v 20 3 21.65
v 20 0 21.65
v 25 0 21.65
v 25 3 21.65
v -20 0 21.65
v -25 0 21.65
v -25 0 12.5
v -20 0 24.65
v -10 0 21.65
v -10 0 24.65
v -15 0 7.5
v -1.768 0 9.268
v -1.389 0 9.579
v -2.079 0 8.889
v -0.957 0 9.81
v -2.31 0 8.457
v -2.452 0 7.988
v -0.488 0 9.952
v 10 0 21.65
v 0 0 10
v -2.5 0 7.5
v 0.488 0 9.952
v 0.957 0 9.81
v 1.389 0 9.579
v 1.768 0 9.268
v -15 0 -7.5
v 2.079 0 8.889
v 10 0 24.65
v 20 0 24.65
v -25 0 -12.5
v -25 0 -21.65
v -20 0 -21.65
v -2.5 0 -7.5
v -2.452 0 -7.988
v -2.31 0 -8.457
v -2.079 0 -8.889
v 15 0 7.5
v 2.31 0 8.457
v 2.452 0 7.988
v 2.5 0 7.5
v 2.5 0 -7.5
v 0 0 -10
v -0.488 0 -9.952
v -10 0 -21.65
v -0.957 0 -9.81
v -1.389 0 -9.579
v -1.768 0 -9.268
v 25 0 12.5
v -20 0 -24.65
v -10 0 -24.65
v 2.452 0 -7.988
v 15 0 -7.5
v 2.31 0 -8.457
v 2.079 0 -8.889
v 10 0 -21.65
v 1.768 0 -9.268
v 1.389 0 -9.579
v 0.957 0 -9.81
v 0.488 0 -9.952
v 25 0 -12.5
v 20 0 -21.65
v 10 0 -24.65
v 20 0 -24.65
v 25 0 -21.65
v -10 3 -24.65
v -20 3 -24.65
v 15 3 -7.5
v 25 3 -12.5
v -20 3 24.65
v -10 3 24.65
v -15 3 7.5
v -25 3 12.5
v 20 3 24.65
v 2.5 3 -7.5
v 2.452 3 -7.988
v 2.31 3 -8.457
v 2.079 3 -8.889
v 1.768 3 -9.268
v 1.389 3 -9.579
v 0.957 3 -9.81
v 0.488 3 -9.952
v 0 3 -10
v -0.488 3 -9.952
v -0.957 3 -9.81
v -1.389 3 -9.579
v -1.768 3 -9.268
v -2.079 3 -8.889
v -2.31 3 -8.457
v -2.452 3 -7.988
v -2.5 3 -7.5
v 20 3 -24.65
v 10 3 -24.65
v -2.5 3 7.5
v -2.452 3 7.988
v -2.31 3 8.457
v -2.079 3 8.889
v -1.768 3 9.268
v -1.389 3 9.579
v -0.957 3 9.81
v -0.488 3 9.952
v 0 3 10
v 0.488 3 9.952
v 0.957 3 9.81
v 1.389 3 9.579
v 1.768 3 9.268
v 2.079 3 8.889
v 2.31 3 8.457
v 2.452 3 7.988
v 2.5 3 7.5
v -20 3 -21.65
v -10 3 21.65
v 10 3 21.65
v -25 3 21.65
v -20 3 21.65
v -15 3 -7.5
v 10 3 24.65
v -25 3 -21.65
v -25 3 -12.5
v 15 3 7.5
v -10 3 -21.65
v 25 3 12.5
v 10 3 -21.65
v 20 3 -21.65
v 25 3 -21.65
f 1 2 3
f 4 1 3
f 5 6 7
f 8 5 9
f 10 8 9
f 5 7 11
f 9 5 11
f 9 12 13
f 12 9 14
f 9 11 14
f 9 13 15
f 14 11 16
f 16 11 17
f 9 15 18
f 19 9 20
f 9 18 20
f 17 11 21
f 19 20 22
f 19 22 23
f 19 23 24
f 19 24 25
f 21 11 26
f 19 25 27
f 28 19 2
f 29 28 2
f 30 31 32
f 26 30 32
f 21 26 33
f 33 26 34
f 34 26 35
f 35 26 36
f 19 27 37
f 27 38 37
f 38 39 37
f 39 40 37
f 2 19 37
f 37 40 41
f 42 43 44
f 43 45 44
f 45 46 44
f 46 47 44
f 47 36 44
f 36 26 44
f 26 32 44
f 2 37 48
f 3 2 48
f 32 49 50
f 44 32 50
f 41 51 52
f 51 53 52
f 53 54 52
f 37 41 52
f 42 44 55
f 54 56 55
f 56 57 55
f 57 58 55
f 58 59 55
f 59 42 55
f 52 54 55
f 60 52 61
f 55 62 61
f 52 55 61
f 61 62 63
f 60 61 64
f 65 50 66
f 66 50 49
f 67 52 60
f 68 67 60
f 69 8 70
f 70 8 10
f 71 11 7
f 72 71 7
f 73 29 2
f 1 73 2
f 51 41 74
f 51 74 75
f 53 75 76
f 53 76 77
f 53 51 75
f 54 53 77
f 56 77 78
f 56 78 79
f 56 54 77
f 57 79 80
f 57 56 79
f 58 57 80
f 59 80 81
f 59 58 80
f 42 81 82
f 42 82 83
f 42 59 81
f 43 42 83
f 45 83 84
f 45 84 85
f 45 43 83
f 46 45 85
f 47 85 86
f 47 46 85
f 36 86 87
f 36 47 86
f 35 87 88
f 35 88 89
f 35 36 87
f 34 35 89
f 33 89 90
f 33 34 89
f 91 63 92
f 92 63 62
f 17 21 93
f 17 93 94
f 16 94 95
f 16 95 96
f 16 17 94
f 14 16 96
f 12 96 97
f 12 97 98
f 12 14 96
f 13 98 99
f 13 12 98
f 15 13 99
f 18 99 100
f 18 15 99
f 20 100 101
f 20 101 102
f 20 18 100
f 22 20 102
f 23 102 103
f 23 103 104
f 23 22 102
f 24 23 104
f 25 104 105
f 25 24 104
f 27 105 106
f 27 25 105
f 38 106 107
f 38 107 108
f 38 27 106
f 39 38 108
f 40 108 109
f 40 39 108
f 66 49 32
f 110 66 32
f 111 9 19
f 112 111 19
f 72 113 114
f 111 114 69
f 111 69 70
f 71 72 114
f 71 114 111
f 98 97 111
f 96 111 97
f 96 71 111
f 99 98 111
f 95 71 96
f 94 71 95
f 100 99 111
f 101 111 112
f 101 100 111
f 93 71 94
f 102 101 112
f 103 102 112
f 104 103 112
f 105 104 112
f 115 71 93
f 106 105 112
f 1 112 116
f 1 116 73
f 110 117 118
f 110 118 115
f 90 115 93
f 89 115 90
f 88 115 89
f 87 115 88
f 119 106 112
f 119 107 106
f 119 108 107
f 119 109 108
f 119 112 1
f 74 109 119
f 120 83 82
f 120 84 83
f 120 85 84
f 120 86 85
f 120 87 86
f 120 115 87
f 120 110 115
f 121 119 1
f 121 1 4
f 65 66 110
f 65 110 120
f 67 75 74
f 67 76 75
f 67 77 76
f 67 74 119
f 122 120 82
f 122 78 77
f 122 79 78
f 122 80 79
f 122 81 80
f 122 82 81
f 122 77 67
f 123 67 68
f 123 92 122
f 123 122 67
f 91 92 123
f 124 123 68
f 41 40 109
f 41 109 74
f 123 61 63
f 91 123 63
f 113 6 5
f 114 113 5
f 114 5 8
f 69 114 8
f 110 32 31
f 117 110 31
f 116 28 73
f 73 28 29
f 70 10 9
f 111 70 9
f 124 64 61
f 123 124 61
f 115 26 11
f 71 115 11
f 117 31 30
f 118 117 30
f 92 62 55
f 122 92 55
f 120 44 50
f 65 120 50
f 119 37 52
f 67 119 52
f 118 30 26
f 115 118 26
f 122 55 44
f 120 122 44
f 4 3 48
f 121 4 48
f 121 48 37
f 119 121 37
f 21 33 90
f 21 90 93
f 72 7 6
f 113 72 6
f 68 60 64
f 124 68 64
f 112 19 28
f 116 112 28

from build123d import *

# Parameters (mm, degrees)
EXTRUDE_1_DEPTH = 3


with BuildPart() as part:
    # 草图2 → 凸台-拉伸1 (new body)
    with BuildSketch(Plane(origin=(0, 0, 0), x_dir=(1, 0, 0), z_dir=(0, 1, 0))):
        Polygon((15, -7.5), (15, 7.5), (25, 12.5), (25, 21.65), (20, 21.65), (20, 24.65), (10, 24.65), (10, 21.65), (-10, 21.65), (-10, 24.65), (-20, 24.65), (-20, 21.65), (-25, 21.65), (-25, 12.5), (-15, 7.5), (-15, -7.5), (-25, -12.5), (-25, -21.65), (-20, -21.65), (-20, -24.65), (-10, -24.65), (-10, -21.65), (10, -21.65), (10, -24.65), (20, -24.65), (20, -21.65), (25, -21.65), (25, -12.5), align=None)
        with BuildLine():
            Line((-2.5, 7.5), (-2.5, -7.5))
            ThreePointArc((-2.5, -7.5), (0, -10), (2.5, -7.5))
            Line((2.5, -7.5), (2.5, 7.5))
            ThreePointArc((2.5, 7.5), (0, 10), (-2.5, 7.5))
        make_face(mode=Mode.SUBTRACT)
    extrude(amount=EXTRUDE_1_DEPTH)


solid = part.part
